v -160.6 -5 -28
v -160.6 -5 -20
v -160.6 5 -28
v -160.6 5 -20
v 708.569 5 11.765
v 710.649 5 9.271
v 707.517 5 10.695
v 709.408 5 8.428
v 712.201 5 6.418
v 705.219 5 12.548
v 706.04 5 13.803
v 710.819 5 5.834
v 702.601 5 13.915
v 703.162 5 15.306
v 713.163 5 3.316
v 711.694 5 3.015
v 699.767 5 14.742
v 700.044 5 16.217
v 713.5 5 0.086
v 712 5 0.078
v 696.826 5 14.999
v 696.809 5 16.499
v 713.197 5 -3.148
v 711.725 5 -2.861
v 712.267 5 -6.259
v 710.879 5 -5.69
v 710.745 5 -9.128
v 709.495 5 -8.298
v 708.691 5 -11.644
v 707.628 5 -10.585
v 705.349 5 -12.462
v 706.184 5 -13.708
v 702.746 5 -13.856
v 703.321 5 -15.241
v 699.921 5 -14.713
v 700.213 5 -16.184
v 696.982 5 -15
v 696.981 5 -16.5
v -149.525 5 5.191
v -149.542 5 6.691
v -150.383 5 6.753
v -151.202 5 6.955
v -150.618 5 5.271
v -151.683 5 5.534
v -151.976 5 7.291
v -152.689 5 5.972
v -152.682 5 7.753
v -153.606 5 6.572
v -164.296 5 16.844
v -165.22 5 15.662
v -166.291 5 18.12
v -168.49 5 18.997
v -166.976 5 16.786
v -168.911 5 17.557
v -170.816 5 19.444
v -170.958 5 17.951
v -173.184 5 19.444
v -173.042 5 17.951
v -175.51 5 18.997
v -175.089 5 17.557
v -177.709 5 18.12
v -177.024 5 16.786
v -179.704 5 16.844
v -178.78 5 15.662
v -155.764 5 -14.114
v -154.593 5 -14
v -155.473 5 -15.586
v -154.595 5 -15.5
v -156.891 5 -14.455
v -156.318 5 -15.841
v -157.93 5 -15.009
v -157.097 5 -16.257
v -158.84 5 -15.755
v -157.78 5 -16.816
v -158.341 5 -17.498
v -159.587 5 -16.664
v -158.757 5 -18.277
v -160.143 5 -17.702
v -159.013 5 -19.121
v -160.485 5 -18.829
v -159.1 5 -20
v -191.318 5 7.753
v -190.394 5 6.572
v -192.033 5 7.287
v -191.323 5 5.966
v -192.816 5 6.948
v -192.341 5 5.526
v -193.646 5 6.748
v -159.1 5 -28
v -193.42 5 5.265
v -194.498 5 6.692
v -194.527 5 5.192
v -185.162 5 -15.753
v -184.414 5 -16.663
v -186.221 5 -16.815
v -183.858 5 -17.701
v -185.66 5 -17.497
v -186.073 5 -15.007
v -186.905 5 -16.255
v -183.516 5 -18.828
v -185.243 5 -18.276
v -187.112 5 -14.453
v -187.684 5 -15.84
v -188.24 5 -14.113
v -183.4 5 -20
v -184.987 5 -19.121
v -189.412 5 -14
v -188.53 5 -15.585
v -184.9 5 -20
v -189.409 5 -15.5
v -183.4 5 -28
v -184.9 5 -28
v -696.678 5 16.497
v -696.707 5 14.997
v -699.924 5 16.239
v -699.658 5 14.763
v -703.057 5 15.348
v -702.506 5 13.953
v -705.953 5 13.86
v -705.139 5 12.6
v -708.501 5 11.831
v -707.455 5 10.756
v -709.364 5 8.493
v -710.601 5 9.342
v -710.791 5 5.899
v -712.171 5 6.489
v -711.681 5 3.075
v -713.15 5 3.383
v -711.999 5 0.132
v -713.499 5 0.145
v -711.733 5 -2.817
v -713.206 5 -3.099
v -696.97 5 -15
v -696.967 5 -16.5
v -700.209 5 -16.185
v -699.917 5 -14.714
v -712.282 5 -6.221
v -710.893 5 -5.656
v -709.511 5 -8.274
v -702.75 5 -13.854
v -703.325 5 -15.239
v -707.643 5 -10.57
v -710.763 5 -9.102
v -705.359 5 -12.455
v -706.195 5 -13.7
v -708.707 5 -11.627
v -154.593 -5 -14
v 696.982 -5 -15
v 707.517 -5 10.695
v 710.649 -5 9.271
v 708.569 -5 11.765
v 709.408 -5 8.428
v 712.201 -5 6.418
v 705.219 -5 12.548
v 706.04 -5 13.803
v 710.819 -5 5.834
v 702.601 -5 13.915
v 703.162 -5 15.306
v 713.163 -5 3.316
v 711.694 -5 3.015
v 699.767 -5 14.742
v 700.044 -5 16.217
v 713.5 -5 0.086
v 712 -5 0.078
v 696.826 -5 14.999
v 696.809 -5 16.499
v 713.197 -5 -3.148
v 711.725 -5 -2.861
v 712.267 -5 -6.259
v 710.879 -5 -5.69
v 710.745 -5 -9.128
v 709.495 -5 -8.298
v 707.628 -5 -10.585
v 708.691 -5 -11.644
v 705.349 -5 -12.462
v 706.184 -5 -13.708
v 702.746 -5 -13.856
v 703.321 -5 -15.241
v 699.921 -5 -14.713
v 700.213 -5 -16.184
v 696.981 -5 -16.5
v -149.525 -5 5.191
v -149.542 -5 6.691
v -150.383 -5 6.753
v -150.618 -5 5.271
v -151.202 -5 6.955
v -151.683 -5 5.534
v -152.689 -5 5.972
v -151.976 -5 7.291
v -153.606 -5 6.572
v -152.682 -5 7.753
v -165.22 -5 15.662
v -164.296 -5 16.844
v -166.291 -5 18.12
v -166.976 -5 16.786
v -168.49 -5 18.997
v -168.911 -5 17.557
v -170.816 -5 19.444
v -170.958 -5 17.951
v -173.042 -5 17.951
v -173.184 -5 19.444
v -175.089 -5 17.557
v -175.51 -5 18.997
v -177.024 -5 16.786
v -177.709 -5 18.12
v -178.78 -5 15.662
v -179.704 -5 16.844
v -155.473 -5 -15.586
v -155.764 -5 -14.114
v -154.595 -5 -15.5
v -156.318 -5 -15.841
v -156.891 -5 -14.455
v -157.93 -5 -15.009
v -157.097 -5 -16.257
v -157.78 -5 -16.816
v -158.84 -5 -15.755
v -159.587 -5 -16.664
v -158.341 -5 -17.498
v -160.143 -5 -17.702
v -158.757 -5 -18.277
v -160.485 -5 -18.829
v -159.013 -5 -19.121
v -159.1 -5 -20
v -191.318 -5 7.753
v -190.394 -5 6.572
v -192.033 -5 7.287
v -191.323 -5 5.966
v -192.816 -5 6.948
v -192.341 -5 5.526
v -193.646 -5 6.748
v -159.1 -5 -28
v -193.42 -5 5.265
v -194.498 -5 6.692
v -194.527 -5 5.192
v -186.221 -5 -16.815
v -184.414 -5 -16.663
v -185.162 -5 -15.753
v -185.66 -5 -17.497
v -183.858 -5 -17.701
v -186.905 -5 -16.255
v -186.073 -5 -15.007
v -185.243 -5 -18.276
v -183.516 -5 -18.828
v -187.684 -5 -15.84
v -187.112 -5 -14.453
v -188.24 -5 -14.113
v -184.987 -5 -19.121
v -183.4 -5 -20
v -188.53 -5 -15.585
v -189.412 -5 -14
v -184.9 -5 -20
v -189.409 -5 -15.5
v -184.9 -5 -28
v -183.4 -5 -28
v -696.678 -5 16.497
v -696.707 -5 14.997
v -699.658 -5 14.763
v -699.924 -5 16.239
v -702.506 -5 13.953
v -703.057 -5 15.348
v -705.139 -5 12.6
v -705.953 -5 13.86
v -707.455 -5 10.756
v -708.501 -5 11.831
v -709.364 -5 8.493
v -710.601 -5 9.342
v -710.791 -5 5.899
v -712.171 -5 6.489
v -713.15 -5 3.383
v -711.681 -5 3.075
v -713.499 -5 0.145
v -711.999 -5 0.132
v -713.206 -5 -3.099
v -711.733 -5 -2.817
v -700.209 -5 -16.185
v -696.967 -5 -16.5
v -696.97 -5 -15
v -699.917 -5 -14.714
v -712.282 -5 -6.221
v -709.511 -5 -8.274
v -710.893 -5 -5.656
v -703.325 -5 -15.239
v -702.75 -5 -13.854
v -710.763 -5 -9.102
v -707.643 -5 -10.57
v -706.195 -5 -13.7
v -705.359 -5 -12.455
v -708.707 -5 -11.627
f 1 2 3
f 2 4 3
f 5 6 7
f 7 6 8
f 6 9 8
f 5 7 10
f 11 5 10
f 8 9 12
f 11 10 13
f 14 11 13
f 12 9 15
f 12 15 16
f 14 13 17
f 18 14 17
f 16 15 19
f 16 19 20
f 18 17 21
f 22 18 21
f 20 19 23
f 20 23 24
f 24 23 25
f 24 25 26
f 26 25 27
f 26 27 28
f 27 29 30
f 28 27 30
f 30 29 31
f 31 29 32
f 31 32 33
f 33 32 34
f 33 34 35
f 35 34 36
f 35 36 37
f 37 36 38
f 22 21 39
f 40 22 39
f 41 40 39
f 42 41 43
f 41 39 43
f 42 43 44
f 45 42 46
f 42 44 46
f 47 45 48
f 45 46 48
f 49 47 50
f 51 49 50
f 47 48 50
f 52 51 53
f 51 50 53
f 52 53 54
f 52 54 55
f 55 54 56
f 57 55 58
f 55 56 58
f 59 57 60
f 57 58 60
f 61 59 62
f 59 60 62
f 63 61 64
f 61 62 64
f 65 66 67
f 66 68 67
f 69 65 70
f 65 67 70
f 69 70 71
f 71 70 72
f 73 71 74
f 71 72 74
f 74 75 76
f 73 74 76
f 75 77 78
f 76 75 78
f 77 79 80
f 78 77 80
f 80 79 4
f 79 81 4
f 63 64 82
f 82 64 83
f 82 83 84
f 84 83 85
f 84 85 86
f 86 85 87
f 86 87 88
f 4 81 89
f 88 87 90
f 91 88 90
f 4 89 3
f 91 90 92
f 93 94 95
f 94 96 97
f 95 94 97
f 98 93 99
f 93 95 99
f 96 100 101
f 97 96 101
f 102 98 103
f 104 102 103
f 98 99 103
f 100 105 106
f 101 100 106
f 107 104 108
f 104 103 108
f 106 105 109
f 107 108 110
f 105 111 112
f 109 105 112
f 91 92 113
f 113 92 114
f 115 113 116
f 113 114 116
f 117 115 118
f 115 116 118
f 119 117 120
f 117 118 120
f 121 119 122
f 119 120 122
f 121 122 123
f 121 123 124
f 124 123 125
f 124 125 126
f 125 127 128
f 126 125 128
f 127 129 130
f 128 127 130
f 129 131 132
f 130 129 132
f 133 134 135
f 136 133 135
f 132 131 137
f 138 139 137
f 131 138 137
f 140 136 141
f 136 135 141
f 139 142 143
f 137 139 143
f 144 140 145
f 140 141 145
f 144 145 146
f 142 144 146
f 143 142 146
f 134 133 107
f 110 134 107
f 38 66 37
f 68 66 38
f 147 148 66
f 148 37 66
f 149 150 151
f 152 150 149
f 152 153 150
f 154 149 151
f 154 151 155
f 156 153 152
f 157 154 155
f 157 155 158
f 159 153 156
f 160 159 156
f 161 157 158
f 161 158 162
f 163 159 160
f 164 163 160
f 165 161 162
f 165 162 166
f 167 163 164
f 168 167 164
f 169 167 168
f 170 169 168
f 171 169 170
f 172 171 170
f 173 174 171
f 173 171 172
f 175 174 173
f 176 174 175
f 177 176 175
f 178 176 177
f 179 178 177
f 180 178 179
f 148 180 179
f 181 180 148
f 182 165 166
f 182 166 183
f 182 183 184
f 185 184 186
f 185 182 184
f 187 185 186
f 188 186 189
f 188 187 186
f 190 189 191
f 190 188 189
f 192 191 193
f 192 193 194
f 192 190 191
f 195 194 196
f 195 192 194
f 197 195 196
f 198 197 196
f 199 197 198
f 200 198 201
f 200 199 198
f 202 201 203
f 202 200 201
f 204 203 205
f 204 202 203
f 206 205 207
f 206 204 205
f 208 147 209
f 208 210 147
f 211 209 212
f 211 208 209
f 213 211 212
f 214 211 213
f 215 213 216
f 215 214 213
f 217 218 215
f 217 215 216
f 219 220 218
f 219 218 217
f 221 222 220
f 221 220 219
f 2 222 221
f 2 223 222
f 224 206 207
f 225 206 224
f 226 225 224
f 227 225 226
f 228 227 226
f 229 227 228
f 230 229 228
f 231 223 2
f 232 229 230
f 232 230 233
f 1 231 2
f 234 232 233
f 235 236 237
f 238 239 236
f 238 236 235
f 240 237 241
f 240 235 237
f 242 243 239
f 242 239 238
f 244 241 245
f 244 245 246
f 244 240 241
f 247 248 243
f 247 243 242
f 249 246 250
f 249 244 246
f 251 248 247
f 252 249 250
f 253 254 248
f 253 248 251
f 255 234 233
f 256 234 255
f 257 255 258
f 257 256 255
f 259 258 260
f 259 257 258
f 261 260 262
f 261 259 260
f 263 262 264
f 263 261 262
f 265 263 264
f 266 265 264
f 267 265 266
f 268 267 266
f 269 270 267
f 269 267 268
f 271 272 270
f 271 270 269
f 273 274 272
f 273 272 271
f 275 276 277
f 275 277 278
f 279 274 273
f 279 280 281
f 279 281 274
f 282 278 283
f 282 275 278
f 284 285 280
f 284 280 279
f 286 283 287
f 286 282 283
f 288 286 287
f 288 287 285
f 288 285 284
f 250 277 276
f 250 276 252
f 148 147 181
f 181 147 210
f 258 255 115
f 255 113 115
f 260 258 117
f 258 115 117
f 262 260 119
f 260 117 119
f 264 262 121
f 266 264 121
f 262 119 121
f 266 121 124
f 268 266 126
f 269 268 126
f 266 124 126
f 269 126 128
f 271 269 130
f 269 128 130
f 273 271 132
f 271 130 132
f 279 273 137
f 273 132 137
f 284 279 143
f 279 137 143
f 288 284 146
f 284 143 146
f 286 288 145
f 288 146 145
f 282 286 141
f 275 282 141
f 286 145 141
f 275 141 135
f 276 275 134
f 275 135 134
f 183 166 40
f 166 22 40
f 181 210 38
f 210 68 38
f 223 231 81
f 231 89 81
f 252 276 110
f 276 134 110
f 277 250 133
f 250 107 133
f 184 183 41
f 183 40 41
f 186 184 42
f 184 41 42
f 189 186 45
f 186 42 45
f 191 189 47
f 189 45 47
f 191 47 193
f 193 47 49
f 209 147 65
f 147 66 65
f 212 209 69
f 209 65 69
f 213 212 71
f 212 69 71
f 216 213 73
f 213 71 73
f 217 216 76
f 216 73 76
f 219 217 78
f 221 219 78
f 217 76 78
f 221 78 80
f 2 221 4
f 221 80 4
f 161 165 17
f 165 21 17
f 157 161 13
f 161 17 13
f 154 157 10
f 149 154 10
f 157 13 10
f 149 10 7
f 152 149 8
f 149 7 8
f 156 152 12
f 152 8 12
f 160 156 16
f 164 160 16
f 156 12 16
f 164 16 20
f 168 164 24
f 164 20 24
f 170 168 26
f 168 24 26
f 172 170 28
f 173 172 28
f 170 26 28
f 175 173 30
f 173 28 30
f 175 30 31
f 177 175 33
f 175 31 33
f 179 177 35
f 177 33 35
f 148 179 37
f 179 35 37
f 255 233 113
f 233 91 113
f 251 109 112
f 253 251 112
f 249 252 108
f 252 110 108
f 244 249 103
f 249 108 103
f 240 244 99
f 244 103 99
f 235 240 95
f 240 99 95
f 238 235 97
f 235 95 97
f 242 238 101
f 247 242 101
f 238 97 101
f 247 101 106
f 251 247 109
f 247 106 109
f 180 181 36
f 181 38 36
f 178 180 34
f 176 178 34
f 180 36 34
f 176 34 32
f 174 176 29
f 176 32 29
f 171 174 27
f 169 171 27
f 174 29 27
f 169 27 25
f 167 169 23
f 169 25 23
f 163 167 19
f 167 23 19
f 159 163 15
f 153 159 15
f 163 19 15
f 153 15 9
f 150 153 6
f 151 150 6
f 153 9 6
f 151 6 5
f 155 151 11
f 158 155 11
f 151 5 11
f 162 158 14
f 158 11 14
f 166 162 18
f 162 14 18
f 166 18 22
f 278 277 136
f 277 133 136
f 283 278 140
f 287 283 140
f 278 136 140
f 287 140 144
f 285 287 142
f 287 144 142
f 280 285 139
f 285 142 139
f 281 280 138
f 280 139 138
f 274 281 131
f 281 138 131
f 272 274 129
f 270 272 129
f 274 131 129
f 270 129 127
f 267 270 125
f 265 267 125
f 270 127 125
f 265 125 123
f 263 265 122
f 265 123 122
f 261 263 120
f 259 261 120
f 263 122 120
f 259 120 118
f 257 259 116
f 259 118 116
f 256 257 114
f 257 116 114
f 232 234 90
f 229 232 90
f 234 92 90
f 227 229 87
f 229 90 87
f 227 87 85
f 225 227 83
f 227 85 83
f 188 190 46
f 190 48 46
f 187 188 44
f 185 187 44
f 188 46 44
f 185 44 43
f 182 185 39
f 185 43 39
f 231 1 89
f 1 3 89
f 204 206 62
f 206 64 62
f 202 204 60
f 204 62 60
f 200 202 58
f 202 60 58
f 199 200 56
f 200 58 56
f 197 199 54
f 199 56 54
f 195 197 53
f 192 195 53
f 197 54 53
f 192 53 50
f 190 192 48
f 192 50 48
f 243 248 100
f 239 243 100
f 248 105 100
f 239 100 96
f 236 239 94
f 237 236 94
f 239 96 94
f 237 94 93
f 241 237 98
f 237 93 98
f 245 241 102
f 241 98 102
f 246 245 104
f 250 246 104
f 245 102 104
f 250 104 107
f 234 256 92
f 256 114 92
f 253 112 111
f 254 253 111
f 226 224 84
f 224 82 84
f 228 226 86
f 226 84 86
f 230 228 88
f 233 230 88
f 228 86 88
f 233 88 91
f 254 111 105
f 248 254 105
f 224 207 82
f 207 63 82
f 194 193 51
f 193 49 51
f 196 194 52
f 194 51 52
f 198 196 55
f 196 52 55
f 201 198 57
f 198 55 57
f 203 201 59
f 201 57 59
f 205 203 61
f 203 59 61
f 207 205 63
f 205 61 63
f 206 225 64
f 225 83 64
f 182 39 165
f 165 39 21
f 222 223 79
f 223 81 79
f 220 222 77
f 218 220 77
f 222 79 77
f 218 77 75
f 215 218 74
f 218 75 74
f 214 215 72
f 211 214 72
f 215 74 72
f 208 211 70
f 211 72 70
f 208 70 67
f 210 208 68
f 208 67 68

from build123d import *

# Parameters (mm, degrees)
EXTRUDE_THIN1_DEPTH = 5


with BuildPart() as part:
    # Sketch1 → Extrude-Thin1 (new, symmetric)
    with BuildSketch(Plane(origin=(0, 0, 0), x_dir=(1, 0, 0), z_dir=(0, 1, 0))):
        with BuildLine():
            Line((-183.400000811, 28), (-183.400000811, 20))
            ThreePointArc((-183.400000811, 20), (-185.161544932, 15.753173798), (-189.411833406, 14))
            Line((-189.411833406, 14), (-696.970447681, 14.999970889))
            ThreePointArc((-696.970447681, 14.999970889), (-711.999422352, -0.131640078), (-696.707182726, -14.997141662))
            Line((-696.707182726, -14.997141662), (-194.526888217, -5.192135604))
            ThreePointArc((-194.526888217, -5.192135604), (-192.341242187, -5.52554921), (-190.393789073, -6.572277241))
            Line((-190.393789073, -6.572277241), (-178.779742807, -15.662291703))
            ThreePointArc((-178.779742807, -15.662291703), (-172, -18.000012126), (-165.220257193, -15.662291703))
            Line((-165.220257193, -15.662291703), (-153.606210927, -6.572277241))
            ThreePointArc((-153.606210927, -6.572277241), (-151.683201757, -5.533765565), (-149.524681207, -5.191333376))
            Line((-149.524681207, -5.191333376), (696.826189088, -14.998992958))
            ThreePointArc((696.826189088, -14.998992958), (711.999796679, -0.078099937), (696.982385781, 14.999989658))
            Line((696.982385781, 14.999989658), (-154.59294936, 14))
            ThreePointArc((-154.59294936, 14), (-158.840146905, 15.75486609), (-160.599999189, 20))
            Line((-160.599999189, 20), (-160.599999189, 28))
            Line((-160.599999189, 28), (-159.099999189, 28))
            Line((-159.099999189, 28), (-159.099999189, 20))
            ThreePointArc((-159.099999189, 20), (-157.780109672, 16.816148836), (-154.594710782, 15.499998966))
            Line((-154.594710782, 15.499998966), (696.980624359, 16.499988624))
            ThreePointArc((696.980624359, 16.499988624), (713.499776346, -0.08590993), (696.808807996, -16.498892254))
            Line((696.808807996, -16.498892254), (-149.542062298, -6.691232672))
            ThreePointArc((-149.542062298, -6.691232672), (-151.202462721, -6.954642048), (-152.681700545, -7.753497183))
            Line((-152.681700545, -7.753497183), (-164.29574681, -16.843511645))
            ThreePointArc((-164.29574681, -16.843511645), (-172, -19.500012126), (-179.70425319, -16.843511645))
            Line((-179.70425319, -16.843511645), (-191.318299455, -7.753497183))
            ThreePointArc((-191.318299455, -7.753497183), (-192.816340312, -6.948321775), (-194.497606489, -6.69184977))
            Line((-194.497606489, -6.69184977), (-696.677900999, -16.496855829))
            ThreePointArc((-696.677900999, -16.496855829), (-713.499364587, -0.144804086), (-696.967492449, 16.499967978))
            Line((-696.967492449, 16.499967978), (-189.408878174, 15.499997089))
            ThreePointArc((-189.408878174, 15.499997089), (-186.221159756, 16.814878288), (-184.900000811, 20))
            Line((-184.900000811, 20), (-184.900000811, 28))
            Line((-184.900000811, 28), (-183.400000811, 28))
        make_face()
    extrude(amount=EXTRUDE_THIN1_DEPTH, both=True)


solid = part.part
